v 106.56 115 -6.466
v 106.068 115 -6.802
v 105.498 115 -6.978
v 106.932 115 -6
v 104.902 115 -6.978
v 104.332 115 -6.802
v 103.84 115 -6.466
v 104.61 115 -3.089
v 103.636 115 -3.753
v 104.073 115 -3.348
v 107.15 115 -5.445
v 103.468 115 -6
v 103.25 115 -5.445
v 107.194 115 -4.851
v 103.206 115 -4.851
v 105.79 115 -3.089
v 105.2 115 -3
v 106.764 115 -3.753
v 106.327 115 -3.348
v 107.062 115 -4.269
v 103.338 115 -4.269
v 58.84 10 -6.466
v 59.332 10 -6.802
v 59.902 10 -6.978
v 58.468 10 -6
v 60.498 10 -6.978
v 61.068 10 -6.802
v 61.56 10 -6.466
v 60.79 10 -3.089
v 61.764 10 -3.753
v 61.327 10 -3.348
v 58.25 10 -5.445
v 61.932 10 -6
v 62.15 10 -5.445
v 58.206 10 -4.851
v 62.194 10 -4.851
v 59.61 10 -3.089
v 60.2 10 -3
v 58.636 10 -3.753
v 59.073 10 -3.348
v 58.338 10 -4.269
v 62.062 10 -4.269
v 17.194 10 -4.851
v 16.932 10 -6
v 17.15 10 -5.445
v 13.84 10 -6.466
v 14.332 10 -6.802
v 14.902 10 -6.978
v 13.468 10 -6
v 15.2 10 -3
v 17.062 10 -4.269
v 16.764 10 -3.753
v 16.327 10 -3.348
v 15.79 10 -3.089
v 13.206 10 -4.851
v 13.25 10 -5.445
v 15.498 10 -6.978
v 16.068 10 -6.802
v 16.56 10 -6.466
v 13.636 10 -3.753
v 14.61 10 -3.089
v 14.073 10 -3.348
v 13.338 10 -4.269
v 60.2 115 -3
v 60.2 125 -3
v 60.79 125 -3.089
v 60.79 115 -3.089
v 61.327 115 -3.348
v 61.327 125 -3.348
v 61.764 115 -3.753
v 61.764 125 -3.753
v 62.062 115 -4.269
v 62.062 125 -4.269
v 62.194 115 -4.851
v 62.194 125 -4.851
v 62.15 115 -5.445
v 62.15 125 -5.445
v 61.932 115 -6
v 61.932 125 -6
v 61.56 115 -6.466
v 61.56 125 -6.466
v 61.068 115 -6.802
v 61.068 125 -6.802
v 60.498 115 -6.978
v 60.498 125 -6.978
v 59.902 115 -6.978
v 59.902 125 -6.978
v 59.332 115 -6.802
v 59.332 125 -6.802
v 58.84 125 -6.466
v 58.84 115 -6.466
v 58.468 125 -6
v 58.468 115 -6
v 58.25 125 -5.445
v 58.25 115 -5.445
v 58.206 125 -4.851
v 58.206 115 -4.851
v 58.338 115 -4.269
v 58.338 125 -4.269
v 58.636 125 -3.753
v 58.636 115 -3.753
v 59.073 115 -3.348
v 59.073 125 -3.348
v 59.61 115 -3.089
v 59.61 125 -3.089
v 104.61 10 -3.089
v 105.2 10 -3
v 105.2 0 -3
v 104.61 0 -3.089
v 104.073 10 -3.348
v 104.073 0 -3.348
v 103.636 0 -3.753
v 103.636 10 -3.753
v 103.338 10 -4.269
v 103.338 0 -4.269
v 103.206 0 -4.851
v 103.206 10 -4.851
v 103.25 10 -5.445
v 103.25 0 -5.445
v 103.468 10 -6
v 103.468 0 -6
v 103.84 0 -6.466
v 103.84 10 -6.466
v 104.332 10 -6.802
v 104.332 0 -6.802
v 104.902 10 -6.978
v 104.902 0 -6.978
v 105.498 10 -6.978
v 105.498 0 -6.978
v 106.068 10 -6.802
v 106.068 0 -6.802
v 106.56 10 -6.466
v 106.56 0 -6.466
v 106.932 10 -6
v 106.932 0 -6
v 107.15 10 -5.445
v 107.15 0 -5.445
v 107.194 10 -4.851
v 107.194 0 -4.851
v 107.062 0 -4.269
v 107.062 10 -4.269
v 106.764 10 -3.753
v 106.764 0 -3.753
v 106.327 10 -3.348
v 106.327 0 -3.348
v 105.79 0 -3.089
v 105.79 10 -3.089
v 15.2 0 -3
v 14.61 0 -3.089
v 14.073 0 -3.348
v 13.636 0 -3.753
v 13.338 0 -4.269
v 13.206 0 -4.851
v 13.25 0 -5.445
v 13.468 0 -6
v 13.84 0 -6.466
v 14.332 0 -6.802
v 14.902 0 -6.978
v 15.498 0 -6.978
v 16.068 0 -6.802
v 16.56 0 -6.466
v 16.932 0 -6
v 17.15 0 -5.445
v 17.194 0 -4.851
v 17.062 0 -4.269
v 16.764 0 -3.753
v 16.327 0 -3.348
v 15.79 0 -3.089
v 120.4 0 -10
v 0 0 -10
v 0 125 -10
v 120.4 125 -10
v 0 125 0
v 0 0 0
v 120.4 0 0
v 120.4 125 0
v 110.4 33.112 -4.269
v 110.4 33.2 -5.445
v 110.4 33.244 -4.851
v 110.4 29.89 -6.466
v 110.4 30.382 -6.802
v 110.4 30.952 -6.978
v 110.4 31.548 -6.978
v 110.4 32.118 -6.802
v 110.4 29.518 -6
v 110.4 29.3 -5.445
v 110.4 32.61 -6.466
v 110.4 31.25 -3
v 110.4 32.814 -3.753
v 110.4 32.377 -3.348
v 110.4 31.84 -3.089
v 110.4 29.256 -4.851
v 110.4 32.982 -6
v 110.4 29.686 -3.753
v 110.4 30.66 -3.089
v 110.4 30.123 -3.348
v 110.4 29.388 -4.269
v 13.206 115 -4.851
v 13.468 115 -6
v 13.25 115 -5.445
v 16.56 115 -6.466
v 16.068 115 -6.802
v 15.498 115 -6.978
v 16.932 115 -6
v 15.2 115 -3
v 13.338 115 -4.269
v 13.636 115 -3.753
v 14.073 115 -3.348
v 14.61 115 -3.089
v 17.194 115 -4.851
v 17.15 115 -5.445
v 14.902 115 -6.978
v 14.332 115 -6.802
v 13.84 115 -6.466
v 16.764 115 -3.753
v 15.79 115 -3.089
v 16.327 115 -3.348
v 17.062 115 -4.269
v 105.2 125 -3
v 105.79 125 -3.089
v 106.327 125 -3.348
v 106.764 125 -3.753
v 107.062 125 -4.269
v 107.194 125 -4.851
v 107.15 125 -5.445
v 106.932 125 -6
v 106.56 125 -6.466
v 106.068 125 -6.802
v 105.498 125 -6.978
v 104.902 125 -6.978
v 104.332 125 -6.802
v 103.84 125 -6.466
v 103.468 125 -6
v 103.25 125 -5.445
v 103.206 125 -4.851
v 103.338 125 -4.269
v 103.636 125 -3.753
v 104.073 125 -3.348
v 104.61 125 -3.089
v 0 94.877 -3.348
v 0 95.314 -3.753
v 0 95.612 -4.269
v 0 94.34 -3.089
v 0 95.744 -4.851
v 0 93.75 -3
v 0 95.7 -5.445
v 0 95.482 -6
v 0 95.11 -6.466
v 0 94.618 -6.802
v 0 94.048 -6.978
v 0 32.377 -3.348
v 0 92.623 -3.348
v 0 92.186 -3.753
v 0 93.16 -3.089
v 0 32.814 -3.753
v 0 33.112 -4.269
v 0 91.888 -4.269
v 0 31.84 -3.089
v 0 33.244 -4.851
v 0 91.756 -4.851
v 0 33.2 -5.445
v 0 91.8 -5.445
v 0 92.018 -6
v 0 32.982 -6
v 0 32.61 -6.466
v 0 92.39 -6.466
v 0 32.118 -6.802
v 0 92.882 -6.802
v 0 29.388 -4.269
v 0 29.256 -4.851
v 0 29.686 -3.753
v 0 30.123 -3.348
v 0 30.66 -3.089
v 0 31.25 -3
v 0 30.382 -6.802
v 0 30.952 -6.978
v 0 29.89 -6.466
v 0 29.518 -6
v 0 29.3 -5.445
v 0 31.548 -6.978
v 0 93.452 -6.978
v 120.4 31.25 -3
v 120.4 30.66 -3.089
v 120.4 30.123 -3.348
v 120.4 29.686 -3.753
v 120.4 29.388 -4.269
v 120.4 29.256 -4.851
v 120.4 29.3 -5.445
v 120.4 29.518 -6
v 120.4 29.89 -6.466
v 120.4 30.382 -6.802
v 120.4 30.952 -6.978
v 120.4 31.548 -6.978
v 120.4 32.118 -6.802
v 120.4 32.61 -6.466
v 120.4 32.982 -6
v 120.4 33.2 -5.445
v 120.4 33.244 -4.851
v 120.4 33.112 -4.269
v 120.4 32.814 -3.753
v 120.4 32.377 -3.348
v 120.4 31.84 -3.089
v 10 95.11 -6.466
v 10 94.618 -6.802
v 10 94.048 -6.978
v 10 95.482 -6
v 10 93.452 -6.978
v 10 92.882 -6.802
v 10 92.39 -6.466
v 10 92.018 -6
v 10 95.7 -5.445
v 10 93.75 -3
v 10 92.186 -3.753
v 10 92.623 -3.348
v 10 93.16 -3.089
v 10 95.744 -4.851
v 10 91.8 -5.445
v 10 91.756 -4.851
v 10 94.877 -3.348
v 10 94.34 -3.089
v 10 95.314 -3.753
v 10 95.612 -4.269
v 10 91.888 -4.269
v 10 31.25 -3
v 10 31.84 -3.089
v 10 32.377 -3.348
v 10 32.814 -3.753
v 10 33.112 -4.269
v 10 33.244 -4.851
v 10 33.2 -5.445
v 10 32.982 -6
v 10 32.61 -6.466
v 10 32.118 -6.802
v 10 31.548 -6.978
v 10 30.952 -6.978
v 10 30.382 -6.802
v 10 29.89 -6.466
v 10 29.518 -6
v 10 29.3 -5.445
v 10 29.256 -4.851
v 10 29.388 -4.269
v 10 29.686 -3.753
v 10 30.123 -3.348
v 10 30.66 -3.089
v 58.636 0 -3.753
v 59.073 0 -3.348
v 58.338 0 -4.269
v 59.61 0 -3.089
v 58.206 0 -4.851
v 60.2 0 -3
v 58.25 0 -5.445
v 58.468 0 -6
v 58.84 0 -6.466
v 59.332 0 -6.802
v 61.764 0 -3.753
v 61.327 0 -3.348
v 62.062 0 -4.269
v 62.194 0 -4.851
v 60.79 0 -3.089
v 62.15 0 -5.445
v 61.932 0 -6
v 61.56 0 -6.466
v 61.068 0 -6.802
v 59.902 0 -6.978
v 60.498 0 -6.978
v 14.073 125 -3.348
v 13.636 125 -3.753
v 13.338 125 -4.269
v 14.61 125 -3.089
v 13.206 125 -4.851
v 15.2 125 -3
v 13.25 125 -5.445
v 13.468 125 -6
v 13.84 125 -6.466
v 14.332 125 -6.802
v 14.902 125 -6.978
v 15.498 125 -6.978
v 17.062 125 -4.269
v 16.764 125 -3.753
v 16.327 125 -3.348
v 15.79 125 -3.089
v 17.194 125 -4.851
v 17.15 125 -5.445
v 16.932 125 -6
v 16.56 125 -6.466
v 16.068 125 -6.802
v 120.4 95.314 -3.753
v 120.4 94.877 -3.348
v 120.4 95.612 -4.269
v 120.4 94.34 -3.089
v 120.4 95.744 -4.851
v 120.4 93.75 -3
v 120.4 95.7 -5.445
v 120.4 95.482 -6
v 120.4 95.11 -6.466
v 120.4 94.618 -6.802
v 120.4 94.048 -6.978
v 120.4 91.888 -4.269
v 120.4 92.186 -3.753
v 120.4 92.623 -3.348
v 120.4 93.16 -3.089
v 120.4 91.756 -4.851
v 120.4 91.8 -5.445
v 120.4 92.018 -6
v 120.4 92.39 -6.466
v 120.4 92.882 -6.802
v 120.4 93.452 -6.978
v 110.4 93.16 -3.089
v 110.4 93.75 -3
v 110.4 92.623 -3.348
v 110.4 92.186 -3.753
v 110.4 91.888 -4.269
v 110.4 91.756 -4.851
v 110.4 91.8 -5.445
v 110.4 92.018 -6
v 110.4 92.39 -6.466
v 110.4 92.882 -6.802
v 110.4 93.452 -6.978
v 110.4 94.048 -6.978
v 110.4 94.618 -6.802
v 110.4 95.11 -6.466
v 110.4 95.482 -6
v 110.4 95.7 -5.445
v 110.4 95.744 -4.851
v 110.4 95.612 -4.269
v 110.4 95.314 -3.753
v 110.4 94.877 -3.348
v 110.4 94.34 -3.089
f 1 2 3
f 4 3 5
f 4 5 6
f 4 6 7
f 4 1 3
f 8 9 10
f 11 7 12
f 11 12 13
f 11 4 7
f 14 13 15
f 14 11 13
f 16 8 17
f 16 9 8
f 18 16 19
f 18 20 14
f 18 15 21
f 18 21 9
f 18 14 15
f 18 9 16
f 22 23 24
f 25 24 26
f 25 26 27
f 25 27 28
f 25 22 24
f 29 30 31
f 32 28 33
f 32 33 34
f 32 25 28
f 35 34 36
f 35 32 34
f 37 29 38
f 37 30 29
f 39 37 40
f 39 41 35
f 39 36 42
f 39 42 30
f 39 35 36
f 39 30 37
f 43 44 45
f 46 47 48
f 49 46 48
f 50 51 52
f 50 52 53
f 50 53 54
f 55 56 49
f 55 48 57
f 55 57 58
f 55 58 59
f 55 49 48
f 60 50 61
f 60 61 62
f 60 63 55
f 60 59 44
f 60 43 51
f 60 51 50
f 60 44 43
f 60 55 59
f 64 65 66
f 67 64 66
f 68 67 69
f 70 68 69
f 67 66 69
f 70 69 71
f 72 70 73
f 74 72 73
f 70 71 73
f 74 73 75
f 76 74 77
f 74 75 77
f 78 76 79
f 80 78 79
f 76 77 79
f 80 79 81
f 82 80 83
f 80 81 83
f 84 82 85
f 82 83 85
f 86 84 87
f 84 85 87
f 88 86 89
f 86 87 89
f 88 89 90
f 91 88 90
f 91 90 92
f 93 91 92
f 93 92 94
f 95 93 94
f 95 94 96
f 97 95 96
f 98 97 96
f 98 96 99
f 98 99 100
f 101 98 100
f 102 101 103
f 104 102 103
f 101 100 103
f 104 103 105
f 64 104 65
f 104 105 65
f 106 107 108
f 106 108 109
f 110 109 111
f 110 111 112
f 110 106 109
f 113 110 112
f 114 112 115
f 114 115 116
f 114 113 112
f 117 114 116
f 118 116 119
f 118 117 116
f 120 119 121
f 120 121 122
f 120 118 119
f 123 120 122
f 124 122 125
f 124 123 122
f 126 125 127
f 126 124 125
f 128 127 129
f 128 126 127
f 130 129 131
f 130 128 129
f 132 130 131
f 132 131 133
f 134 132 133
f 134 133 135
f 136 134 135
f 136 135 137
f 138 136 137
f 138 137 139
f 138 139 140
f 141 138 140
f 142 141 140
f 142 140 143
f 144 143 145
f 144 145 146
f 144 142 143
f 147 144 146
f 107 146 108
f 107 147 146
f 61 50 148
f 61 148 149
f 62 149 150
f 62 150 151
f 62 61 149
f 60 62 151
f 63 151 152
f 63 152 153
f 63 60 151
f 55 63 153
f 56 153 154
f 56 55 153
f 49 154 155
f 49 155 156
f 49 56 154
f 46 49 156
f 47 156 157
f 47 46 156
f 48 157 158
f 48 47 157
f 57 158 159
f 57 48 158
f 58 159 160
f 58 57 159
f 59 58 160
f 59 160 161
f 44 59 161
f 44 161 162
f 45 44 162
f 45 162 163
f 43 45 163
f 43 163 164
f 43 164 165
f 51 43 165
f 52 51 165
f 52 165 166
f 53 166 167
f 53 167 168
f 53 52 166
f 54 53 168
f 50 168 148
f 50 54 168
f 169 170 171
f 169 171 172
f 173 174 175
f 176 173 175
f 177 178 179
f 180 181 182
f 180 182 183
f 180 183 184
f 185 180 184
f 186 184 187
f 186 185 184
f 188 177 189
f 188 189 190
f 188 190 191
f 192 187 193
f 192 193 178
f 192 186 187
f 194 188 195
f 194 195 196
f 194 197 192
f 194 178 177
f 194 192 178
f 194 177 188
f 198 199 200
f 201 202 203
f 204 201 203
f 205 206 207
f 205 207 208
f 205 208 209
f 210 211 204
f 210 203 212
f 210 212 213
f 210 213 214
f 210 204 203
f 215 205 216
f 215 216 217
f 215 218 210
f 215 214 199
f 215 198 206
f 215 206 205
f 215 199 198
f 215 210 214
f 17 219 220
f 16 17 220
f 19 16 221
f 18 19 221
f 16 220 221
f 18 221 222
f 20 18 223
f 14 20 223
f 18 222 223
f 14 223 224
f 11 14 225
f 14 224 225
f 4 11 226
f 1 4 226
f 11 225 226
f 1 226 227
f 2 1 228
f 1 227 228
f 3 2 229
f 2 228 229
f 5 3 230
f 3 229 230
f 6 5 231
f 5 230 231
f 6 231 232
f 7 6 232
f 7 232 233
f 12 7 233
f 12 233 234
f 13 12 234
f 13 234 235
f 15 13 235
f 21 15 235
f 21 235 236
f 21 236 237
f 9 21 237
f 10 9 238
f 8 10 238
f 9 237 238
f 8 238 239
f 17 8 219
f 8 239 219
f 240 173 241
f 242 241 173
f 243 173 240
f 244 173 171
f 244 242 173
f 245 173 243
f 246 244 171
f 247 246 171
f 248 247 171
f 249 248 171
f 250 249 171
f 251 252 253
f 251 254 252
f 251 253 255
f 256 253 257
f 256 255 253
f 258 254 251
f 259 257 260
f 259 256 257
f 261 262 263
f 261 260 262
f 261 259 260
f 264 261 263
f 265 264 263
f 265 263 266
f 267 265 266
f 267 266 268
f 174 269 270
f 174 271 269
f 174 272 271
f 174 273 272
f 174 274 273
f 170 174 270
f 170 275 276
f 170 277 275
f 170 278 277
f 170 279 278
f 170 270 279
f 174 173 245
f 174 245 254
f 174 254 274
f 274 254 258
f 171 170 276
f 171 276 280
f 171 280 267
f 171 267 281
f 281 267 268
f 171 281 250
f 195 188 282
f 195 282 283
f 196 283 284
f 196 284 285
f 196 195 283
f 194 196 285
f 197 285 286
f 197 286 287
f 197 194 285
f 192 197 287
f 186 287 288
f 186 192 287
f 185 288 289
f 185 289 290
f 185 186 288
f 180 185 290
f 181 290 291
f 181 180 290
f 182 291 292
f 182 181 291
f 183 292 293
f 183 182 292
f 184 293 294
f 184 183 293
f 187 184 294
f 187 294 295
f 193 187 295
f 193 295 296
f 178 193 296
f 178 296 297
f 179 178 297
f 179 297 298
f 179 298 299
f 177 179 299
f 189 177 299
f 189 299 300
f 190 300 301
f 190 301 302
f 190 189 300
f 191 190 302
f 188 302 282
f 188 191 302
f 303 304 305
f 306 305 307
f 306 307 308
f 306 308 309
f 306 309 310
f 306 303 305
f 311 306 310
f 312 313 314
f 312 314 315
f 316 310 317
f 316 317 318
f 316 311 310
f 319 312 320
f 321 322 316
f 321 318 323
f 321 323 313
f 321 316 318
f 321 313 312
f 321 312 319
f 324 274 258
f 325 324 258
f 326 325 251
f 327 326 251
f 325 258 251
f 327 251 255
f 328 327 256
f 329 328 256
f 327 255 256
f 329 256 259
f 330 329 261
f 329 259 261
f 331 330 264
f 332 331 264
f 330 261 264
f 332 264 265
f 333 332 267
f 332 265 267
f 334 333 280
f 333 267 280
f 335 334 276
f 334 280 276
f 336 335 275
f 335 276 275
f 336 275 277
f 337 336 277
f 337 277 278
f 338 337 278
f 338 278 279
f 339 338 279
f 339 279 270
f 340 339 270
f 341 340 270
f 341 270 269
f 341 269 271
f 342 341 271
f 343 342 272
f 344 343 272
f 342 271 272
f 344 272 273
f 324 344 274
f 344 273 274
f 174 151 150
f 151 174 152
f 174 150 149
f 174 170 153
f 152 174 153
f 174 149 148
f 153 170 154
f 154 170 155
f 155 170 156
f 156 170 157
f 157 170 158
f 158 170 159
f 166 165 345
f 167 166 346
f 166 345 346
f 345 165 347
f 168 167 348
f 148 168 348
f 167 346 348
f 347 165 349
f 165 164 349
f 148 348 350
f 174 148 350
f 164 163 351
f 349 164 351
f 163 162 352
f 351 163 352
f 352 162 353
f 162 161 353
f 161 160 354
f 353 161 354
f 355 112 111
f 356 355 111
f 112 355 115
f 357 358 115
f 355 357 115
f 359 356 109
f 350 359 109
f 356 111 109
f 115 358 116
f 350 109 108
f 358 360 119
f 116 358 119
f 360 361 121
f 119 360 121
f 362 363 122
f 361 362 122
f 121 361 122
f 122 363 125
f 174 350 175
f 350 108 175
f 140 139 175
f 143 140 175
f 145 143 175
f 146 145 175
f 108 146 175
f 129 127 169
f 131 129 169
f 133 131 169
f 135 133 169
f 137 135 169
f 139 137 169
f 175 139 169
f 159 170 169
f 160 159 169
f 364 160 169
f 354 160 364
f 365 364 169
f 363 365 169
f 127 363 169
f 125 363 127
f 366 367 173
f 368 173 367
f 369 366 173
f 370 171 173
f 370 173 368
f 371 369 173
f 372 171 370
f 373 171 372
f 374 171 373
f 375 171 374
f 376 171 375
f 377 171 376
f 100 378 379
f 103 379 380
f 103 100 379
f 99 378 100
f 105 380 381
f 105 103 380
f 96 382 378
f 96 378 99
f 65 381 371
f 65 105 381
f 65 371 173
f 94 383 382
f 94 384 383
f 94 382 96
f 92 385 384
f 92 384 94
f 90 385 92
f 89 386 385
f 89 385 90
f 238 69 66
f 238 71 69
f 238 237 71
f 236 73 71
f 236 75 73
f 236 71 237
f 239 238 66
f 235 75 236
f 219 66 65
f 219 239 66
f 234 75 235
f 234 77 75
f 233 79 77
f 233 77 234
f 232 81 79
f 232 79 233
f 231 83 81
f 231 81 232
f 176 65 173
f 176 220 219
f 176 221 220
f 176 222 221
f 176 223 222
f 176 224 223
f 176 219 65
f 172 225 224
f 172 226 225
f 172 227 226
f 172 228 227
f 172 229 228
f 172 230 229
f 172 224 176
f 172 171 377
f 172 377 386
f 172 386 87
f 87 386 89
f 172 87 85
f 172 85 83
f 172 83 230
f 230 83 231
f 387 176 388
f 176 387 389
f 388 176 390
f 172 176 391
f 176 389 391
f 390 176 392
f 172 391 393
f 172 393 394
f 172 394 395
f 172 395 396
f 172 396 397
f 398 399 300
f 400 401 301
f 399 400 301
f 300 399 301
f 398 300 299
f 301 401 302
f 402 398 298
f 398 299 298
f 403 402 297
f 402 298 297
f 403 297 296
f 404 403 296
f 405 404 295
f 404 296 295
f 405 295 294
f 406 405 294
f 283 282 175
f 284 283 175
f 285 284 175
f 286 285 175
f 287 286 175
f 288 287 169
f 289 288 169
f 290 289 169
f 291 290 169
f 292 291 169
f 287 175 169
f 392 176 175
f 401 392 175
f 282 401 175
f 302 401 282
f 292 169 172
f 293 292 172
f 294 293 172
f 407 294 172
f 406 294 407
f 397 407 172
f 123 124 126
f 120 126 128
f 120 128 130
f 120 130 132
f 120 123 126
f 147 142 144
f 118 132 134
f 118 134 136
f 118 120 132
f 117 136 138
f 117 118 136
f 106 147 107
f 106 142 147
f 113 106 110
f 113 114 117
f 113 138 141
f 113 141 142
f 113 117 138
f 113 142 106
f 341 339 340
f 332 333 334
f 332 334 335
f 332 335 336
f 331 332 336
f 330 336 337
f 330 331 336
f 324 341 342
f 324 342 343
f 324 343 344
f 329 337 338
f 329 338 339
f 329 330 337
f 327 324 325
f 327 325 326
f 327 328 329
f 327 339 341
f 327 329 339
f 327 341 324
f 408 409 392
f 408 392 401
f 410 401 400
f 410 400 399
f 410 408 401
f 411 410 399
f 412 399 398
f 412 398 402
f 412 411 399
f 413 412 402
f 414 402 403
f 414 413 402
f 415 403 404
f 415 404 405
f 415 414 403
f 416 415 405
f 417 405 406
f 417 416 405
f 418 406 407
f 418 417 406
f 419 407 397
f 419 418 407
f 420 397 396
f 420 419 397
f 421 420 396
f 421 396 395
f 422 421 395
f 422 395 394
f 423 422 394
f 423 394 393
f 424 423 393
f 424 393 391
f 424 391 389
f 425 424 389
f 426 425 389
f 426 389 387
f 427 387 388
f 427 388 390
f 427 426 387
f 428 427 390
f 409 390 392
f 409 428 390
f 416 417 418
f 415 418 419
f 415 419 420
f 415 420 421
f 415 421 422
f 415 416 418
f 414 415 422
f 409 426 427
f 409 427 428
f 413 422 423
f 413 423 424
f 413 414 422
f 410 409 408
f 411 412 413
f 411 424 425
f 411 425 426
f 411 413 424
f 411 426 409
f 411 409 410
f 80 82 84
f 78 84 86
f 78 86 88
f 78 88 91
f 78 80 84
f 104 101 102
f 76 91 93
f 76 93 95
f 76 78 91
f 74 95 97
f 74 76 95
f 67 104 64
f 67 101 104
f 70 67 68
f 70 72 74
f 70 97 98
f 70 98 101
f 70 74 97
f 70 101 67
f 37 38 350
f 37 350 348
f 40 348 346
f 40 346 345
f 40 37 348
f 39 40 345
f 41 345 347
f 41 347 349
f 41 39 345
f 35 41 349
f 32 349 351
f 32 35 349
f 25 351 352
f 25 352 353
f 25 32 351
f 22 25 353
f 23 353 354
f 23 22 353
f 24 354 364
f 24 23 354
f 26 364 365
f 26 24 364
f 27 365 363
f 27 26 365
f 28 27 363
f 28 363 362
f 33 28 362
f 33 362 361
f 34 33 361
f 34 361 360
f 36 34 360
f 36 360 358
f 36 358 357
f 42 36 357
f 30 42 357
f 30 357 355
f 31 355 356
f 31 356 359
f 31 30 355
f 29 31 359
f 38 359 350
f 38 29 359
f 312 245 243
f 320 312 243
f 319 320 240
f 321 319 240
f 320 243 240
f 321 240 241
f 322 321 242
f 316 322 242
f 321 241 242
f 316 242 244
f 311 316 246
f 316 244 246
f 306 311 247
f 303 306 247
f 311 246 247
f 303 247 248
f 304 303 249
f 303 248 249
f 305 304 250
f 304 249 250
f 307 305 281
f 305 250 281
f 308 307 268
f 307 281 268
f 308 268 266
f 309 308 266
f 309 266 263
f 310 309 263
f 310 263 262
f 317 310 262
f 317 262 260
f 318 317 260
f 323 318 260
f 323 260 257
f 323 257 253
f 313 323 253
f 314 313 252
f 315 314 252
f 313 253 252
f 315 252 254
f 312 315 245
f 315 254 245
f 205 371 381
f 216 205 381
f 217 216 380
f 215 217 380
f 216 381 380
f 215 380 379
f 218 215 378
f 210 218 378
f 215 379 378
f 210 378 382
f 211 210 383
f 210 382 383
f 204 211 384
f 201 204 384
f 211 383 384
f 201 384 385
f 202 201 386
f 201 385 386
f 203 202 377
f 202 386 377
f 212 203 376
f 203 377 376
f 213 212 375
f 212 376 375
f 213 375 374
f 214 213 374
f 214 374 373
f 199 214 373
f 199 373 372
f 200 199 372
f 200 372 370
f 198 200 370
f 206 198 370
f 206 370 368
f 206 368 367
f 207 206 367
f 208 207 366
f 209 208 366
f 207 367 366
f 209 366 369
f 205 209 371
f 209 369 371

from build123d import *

# Parameters (mm, degrees)
SKETCH1_W                   = 120.4
SKETCH1_H                   = 10
DODANIE_WYCI_GNI_CIE1_DEPTH = 125
SZKIC1_R                    = 2
WYTNIJ_WYCI_GNI_CIE1_DEPTH  = 10
WYTNIJ_WYCI_GNI_CIE2_START  = -10
SZKIC2_R                    = 2
WYTNIJ_WYCI_GNI_CIE2_DEPTH  = 10
SZKIC3_R                    = 2
WYTNIJ_WYCI_GNI_CIE3_DEPTH  = 10
WYTNIJ_WYCI_GNI_CIE4_START  = -10
SZKIC4_R                    = 2
WYTNIJ_WYCI_GNI_CIE4_DEPTH  = 10


with BuildPart() as part:
    # Sketch1 → Dodanie-wyciągnięcie1 (new body)
    with BuildSketch(Plane(origin=(0, 0, 0), x_dir=(1, 0, 0), z_dir=(0, 1, 0))):
        with Locations((60.2, 5)):
            Rectangle(SKETCH1_W, SKETCH1_H)
    extrude(amount=DODANIE_WYCI_GNI_CIE1_DEPTH)

    # Szkic1 → Wytnij-wyciągnięcie1 (cut)
    with BuildSketch(Plane(origin=(0, 125, 0), x_dir=(1, 0, 0), z_dir=(0, 1, 0))):
        with Locations(Location((15.2, 5, 0), (0, 0, 270))):
            Circle(SZKIC1_R)
        with Locations(Location((60.2, 5, 0), (0, 0, 270))):
            Circle(SZKIC1_R)
        with Locations(Location((105.2, 5, 0), (0, 0, 270))):
            Circle(SZKIC1_R)
    extrude(amount=-WYTNIJ_WYCI_GNI_CIE1_DEPTH, mode=Mode.SUBTRACT)

    # Szkic2 → Wytnij-wyciągnięcie2 (cut)
    with BuildSketch(Plane.XZ.offset(WYTNIJ_WYCI_GNI_CIE2_START)):
        with Locations(Location((15.2, -5, 0), (0, 0, 90))):
            Circle(SZKIC2_R)
        with Locations(Location((60.2, -5, 0), (0, 0, 90))):
            Circle(SZKIC2_R)
        with Locations(Location((105.2, -5, 0), (0, 0, 90))):
            Circle(SZKIC2_R)
    extrude(amount=WYTNIJ_WYCI_GNI_CIE2_DEPTH, mode=Mode.SUBTRACT)

    # Szkic3 → Wytnij-wyciągnięcie3 (cut)
    with BuildSketch(Plane.ZY):
        with Locations((-5, 93.75)):
            Circle(SZKIC3_R)
        with Locations((-5, 31.25)):
            Circle(SZKIC3_R)
    extrude(amount=-WYTNIJ_WYCI_GNI_CIE3_DEPTH, mode=Mode.SUBTRACT)

    # Szkic4 → Wytnij-wyciągnięcie4 (cut)
    with BuildSketch(Plane(origin=(120.4, 0, 0), x_dir=(0, 0, -1), z_dir=(1, 0, 0)).offset(WYTNIJ_WYCI_GNI_CIE4_START)):
        with Locations(Location((5, 93.75, 0), (0, 0, 180))):
            Circle(SZKIC4_R)
        with Locations(Location((5, 31.25, 0), (0, 0, 180))):
            Circle(SZKIC4_R)
    extrude(amount=WYTNIJ_WYCI_GNI_CIE4_DEPTH, mode=Mode.SUBTRACT)


solid = part.part
